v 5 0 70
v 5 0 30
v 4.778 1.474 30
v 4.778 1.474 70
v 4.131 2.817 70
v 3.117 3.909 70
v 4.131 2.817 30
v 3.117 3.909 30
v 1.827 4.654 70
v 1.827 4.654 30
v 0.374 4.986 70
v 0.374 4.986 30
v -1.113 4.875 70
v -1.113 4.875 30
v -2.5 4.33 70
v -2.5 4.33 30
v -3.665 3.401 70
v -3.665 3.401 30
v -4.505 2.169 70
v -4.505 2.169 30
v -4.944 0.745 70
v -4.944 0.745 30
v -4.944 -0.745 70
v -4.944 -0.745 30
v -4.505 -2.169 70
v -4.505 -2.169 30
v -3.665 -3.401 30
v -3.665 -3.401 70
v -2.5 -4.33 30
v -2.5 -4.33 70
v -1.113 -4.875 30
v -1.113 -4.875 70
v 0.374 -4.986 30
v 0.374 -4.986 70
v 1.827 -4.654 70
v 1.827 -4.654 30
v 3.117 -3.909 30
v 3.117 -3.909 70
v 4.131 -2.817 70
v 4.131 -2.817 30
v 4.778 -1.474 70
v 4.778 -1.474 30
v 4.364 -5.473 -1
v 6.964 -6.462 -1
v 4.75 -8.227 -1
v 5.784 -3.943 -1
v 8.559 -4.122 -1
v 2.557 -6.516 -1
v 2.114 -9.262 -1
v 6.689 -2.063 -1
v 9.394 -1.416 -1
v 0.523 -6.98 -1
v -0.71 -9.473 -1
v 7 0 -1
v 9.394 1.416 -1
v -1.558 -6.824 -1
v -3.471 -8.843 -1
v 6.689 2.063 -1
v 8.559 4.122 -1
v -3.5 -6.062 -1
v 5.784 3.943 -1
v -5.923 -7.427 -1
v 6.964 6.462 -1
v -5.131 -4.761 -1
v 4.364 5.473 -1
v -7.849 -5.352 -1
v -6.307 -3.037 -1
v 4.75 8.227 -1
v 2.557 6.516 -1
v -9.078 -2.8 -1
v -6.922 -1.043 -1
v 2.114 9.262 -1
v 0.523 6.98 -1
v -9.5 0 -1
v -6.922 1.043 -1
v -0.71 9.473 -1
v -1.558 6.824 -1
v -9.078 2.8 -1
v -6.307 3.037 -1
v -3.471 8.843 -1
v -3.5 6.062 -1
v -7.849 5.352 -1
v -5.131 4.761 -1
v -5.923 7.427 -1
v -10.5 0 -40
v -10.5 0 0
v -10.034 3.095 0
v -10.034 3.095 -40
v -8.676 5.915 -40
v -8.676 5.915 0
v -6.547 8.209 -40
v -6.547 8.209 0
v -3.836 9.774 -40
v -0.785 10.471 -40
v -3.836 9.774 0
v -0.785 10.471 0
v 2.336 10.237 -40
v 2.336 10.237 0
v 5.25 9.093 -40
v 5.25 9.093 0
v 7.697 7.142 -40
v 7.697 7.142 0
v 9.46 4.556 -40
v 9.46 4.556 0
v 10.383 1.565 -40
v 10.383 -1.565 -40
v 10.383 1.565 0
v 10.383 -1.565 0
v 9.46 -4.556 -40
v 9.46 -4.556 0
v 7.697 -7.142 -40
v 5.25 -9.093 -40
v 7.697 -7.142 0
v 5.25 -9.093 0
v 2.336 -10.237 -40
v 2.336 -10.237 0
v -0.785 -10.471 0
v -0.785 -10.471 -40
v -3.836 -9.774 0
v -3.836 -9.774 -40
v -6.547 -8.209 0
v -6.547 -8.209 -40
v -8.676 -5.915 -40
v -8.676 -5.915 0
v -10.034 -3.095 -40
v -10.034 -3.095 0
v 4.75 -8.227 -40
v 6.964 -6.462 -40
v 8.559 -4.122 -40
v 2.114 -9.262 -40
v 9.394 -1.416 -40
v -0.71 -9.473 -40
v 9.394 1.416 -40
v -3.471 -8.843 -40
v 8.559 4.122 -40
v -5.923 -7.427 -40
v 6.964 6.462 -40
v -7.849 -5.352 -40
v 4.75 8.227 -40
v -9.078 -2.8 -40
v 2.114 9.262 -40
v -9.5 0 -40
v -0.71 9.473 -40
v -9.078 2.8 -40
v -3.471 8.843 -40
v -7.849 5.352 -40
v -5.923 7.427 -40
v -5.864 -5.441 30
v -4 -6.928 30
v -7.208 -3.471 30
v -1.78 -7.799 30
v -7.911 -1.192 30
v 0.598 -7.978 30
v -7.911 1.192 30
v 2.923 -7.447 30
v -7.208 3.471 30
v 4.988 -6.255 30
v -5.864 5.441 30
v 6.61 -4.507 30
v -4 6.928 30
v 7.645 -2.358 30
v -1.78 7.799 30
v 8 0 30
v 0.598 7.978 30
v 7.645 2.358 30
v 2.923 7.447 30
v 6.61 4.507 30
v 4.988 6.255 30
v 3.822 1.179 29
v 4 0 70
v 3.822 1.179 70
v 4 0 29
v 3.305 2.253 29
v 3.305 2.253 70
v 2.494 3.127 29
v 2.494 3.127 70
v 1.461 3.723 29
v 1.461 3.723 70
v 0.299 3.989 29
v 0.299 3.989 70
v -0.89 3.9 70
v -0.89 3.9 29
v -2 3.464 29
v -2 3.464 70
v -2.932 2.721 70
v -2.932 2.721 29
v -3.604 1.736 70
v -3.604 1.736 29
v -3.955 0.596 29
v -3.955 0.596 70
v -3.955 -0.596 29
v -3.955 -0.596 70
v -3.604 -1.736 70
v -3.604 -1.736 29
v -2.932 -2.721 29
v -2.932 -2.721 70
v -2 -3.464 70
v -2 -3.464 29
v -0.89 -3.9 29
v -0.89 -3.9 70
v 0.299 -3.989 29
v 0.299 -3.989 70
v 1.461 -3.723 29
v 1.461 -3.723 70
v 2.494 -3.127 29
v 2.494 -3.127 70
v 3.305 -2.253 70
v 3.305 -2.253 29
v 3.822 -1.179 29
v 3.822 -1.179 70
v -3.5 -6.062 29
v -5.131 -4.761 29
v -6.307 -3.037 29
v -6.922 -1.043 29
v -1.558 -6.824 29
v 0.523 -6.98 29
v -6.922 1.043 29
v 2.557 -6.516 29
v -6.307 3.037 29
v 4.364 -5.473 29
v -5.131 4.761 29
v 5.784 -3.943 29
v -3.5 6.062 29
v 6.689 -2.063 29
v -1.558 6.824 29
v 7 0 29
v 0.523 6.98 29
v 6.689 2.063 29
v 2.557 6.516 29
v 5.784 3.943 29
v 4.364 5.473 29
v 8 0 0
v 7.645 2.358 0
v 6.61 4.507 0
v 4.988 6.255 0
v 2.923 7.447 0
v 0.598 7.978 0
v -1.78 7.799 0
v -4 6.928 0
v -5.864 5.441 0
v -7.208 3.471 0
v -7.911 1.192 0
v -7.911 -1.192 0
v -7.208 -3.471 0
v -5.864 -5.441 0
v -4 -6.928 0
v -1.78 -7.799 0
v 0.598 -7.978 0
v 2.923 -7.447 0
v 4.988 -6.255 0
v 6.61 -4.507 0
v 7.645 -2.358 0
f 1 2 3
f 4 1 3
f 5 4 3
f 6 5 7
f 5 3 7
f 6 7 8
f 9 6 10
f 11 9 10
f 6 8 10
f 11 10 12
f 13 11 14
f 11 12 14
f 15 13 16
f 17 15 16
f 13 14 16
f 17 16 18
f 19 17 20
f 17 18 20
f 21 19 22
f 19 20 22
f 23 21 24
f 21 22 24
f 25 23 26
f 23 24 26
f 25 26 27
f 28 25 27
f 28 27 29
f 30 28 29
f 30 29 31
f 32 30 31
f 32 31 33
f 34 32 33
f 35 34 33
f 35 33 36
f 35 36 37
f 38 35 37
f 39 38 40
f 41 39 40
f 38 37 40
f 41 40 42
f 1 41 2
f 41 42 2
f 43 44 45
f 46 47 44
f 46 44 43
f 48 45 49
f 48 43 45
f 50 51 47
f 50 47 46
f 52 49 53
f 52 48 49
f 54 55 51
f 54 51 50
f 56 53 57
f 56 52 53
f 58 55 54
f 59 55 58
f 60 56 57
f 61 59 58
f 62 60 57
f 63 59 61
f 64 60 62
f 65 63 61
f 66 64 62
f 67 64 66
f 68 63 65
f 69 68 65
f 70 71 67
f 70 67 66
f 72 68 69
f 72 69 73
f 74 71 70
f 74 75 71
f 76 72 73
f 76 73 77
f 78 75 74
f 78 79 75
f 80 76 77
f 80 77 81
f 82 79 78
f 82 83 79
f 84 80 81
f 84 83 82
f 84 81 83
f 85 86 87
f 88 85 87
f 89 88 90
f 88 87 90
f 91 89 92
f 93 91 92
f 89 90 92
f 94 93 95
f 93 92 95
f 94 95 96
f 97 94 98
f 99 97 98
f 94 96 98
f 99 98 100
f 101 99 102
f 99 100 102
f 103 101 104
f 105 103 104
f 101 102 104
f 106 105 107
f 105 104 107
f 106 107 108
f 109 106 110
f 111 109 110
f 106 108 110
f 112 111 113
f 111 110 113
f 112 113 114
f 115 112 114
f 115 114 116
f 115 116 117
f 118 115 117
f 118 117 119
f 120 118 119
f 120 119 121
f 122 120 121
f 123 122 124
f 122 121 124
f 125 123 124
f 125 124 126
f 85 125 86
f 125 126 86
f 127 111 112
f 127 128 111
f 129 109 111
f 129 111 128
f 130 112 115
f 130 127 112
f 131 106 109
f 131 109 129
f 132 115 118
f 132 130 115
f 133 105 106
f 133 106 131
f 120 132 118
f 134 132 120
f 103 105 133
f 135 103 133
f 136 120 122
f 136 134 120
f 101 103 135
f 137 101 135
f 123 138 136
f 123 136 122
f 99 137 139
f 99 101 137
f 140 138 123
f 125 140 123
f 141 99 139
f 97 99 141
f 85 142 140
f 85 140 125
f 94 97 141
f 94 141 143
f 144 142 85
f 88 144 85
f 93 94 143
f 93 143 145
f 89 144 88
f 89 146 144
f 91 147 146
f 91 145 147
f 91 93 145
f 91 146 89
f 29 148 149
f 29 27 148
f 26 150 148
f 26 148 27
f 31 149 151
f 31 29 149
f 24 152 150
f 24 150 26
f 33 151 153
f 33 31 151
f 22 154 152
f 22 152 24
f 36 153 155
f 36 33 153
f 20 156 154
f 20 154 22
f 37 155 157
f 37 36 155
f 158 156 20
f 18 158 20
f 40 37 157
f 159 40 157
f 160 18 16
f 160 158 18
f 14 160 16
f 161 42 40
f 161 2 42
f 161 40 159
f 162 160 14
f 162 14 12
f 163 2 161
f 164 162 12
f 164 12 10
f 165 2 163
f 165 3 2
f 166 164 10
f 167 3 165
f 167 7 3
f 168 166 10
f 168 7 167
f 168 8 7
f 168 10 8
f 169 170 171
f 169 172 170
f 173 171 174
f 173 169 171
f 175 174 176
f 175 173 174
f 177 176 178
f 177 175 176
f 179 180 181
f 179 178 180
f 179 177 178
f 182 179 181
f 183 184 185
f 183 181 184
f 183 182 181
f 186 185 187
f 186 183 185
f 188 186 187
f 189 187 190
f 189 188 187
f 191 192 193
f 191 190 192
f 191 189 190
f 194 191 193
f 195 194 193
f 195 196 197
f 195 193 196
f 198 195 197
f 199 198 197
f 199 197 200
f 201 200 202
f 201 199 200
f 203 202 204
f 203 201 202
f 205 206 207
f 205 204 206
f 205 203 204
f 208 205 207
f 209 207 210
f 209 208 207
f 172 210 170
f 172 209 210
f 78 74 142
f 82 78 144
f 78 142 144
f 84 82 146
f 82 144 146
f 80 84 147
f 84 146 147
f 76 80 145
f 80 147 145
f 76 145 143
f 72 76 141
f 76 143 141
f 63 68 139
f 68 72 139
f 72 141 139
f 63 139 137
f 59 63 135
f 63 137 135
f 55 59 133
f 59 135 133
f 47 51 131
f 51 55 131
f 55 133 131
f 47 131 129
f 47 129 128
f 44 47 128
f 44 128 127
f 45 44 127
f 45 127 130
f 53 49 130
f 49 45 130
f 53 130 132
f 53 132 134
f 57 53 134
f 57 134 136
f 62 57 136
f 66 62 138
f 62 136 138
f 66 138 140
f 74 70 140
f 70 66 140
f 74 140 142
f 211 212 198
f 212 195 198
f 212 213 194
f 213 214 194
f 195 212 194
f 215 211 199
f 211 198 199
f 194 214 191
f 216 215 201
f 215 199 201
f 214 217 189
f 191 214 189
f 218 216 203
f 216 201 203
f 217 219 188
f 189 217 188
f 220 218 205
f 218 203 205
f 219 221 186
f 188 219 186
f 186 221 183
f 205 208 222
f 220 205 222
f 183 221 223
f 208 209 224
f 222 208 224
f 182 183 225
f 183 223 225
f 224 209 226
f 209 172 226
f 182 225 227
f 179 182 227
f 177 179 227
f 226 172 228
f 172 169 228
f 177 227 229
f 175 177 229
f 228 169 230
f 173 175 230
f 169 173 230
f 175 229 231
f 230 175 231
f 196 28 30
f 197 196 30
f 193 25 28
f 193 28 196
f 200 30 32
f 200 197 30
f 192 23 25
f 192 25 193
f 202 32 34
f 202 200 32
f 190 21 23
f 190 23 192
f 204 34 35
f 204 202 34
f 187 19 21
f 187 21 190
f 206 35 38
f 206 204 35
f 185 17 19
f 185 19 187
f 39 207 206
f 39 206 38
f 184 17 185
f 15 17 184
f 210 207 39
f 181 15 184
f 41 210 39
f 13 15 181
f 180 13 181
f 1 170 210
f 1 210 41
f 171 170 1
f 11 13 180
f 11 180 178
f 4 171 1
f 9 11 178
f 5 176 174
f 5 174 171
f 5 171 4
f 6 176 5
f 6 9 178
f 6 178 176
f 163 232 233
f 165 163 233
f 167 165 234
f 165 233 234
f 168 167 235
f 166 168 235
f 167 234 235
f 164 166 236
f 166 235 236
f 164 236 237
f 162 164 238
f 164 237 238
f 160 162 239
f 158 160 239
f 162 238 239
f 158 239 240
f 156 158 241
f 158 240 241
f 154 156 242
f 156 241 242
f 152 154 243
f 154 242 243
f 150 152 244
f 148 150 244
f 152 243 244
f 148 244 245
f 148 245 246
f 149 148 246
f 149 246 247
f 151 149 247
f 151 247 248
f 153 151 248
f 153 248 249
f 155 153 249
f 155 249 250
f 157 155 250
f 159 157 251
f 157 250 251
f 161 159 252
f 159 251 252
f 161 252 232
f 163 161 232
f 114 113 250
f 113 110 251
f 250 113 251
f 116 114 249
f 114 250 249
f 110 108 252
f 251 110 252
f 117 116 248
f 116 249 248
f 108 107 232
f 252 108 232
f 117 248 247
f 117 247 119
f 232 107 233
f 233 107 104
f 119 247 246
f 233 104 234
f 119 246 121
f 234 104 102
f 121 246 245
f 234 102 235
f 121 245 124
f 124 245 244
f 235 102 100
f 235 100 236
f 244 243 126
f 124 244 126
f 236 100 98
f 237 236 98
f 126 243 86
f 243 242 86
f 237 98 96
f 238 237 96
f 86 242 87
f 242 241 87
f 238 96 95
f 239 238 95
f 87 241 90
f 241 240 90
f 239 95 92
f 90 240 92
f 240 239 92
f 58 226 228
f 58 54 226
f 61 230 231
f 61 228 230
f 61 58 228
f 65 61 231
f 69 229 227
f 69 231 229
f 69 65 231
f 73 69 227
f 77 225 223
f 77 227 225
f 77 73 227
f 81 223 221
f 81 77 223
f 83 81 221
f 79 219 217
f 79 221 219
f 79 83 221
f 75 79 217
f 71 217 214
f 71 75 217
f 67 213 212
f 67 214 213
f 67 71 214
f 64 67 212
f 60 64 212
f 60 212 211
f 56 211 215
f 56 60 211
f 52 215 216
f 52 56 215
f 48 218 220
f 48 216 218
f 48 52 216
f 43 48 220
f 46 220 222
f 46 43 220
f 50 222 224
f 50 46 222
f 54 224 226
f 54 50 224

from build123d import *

# Parameters (mm, degrees)
SKETCH1_R           = 8
BOSS_EXTRUDE2_DEPTH = 30
SKETCH2_R           = 5
BOSS_EXTRUDE3_DEPTH = 40
SKETCH4_R           = 10.5
BOSS_EXTRUDE4_DEPTH = 40
SHELL1_T            = -1
CUT_EXTRUDE2_REACH  = 112.998
SKETCH5_R           = 9.5


with BuildPart() as part:
    # Sketch1 → Boss-Extrude2 (new body)
    with BuildSketch(Plane.XY):
        Circle(SKETCH1_R)
    extrude(amount=BOSS_EXTRUDE2_DEPTH)

    # Sketch2 → Boss-Extrude3 (add)
    with BuildSketch(Plane.XY.offset(30)):
        Circle(SKETCH2_R)
    extrude(amount=BOSS_EXTRUDE3_DEPTH)

    # Sketch4 → Boss-Extrude4 (add)
    with BuildSketch(Plane(origin=(0, 0, 0), x_dir=(-1, 0, 0), z_dir=(0, 0, -1))):
        Circle(SKETCH4_R)
    extrude(amount=BOSS_EXTRUDE4_DEPTH)

    # Shell1
    shell1_openings = [part.faces().sort_by_distance(p)[0] for p in [
        (0, 0, 70),
    ]]
    offset(amount=SHELL1_T, openings=shell1_openings, kind=Kind.INTERSECTION)

    # Sketch5 → Cut-Extrude2 (cut, up to next)
    with BuildSketch(Plane(origin=(0, 0, -40), x_dir=(-1, 0, 0), z_dir=(0, 0, -1)), mode=Mode.PRIVATE) as cut_extrude2_sk1:
        Circle(SKETCH5_R)
    cut_extrude2_tool1 = extrude(cut_extrude2_sk1.sketch, amount=-CUT_EXTRUDE2_REACH, mode=Mode.PRIVATE) & part.part
    add(cut_extrude2_tool1.solids().sort_by_distance((0, 0, -40))[0], mode=Mode.SUBTRACT)


solid = part.part
